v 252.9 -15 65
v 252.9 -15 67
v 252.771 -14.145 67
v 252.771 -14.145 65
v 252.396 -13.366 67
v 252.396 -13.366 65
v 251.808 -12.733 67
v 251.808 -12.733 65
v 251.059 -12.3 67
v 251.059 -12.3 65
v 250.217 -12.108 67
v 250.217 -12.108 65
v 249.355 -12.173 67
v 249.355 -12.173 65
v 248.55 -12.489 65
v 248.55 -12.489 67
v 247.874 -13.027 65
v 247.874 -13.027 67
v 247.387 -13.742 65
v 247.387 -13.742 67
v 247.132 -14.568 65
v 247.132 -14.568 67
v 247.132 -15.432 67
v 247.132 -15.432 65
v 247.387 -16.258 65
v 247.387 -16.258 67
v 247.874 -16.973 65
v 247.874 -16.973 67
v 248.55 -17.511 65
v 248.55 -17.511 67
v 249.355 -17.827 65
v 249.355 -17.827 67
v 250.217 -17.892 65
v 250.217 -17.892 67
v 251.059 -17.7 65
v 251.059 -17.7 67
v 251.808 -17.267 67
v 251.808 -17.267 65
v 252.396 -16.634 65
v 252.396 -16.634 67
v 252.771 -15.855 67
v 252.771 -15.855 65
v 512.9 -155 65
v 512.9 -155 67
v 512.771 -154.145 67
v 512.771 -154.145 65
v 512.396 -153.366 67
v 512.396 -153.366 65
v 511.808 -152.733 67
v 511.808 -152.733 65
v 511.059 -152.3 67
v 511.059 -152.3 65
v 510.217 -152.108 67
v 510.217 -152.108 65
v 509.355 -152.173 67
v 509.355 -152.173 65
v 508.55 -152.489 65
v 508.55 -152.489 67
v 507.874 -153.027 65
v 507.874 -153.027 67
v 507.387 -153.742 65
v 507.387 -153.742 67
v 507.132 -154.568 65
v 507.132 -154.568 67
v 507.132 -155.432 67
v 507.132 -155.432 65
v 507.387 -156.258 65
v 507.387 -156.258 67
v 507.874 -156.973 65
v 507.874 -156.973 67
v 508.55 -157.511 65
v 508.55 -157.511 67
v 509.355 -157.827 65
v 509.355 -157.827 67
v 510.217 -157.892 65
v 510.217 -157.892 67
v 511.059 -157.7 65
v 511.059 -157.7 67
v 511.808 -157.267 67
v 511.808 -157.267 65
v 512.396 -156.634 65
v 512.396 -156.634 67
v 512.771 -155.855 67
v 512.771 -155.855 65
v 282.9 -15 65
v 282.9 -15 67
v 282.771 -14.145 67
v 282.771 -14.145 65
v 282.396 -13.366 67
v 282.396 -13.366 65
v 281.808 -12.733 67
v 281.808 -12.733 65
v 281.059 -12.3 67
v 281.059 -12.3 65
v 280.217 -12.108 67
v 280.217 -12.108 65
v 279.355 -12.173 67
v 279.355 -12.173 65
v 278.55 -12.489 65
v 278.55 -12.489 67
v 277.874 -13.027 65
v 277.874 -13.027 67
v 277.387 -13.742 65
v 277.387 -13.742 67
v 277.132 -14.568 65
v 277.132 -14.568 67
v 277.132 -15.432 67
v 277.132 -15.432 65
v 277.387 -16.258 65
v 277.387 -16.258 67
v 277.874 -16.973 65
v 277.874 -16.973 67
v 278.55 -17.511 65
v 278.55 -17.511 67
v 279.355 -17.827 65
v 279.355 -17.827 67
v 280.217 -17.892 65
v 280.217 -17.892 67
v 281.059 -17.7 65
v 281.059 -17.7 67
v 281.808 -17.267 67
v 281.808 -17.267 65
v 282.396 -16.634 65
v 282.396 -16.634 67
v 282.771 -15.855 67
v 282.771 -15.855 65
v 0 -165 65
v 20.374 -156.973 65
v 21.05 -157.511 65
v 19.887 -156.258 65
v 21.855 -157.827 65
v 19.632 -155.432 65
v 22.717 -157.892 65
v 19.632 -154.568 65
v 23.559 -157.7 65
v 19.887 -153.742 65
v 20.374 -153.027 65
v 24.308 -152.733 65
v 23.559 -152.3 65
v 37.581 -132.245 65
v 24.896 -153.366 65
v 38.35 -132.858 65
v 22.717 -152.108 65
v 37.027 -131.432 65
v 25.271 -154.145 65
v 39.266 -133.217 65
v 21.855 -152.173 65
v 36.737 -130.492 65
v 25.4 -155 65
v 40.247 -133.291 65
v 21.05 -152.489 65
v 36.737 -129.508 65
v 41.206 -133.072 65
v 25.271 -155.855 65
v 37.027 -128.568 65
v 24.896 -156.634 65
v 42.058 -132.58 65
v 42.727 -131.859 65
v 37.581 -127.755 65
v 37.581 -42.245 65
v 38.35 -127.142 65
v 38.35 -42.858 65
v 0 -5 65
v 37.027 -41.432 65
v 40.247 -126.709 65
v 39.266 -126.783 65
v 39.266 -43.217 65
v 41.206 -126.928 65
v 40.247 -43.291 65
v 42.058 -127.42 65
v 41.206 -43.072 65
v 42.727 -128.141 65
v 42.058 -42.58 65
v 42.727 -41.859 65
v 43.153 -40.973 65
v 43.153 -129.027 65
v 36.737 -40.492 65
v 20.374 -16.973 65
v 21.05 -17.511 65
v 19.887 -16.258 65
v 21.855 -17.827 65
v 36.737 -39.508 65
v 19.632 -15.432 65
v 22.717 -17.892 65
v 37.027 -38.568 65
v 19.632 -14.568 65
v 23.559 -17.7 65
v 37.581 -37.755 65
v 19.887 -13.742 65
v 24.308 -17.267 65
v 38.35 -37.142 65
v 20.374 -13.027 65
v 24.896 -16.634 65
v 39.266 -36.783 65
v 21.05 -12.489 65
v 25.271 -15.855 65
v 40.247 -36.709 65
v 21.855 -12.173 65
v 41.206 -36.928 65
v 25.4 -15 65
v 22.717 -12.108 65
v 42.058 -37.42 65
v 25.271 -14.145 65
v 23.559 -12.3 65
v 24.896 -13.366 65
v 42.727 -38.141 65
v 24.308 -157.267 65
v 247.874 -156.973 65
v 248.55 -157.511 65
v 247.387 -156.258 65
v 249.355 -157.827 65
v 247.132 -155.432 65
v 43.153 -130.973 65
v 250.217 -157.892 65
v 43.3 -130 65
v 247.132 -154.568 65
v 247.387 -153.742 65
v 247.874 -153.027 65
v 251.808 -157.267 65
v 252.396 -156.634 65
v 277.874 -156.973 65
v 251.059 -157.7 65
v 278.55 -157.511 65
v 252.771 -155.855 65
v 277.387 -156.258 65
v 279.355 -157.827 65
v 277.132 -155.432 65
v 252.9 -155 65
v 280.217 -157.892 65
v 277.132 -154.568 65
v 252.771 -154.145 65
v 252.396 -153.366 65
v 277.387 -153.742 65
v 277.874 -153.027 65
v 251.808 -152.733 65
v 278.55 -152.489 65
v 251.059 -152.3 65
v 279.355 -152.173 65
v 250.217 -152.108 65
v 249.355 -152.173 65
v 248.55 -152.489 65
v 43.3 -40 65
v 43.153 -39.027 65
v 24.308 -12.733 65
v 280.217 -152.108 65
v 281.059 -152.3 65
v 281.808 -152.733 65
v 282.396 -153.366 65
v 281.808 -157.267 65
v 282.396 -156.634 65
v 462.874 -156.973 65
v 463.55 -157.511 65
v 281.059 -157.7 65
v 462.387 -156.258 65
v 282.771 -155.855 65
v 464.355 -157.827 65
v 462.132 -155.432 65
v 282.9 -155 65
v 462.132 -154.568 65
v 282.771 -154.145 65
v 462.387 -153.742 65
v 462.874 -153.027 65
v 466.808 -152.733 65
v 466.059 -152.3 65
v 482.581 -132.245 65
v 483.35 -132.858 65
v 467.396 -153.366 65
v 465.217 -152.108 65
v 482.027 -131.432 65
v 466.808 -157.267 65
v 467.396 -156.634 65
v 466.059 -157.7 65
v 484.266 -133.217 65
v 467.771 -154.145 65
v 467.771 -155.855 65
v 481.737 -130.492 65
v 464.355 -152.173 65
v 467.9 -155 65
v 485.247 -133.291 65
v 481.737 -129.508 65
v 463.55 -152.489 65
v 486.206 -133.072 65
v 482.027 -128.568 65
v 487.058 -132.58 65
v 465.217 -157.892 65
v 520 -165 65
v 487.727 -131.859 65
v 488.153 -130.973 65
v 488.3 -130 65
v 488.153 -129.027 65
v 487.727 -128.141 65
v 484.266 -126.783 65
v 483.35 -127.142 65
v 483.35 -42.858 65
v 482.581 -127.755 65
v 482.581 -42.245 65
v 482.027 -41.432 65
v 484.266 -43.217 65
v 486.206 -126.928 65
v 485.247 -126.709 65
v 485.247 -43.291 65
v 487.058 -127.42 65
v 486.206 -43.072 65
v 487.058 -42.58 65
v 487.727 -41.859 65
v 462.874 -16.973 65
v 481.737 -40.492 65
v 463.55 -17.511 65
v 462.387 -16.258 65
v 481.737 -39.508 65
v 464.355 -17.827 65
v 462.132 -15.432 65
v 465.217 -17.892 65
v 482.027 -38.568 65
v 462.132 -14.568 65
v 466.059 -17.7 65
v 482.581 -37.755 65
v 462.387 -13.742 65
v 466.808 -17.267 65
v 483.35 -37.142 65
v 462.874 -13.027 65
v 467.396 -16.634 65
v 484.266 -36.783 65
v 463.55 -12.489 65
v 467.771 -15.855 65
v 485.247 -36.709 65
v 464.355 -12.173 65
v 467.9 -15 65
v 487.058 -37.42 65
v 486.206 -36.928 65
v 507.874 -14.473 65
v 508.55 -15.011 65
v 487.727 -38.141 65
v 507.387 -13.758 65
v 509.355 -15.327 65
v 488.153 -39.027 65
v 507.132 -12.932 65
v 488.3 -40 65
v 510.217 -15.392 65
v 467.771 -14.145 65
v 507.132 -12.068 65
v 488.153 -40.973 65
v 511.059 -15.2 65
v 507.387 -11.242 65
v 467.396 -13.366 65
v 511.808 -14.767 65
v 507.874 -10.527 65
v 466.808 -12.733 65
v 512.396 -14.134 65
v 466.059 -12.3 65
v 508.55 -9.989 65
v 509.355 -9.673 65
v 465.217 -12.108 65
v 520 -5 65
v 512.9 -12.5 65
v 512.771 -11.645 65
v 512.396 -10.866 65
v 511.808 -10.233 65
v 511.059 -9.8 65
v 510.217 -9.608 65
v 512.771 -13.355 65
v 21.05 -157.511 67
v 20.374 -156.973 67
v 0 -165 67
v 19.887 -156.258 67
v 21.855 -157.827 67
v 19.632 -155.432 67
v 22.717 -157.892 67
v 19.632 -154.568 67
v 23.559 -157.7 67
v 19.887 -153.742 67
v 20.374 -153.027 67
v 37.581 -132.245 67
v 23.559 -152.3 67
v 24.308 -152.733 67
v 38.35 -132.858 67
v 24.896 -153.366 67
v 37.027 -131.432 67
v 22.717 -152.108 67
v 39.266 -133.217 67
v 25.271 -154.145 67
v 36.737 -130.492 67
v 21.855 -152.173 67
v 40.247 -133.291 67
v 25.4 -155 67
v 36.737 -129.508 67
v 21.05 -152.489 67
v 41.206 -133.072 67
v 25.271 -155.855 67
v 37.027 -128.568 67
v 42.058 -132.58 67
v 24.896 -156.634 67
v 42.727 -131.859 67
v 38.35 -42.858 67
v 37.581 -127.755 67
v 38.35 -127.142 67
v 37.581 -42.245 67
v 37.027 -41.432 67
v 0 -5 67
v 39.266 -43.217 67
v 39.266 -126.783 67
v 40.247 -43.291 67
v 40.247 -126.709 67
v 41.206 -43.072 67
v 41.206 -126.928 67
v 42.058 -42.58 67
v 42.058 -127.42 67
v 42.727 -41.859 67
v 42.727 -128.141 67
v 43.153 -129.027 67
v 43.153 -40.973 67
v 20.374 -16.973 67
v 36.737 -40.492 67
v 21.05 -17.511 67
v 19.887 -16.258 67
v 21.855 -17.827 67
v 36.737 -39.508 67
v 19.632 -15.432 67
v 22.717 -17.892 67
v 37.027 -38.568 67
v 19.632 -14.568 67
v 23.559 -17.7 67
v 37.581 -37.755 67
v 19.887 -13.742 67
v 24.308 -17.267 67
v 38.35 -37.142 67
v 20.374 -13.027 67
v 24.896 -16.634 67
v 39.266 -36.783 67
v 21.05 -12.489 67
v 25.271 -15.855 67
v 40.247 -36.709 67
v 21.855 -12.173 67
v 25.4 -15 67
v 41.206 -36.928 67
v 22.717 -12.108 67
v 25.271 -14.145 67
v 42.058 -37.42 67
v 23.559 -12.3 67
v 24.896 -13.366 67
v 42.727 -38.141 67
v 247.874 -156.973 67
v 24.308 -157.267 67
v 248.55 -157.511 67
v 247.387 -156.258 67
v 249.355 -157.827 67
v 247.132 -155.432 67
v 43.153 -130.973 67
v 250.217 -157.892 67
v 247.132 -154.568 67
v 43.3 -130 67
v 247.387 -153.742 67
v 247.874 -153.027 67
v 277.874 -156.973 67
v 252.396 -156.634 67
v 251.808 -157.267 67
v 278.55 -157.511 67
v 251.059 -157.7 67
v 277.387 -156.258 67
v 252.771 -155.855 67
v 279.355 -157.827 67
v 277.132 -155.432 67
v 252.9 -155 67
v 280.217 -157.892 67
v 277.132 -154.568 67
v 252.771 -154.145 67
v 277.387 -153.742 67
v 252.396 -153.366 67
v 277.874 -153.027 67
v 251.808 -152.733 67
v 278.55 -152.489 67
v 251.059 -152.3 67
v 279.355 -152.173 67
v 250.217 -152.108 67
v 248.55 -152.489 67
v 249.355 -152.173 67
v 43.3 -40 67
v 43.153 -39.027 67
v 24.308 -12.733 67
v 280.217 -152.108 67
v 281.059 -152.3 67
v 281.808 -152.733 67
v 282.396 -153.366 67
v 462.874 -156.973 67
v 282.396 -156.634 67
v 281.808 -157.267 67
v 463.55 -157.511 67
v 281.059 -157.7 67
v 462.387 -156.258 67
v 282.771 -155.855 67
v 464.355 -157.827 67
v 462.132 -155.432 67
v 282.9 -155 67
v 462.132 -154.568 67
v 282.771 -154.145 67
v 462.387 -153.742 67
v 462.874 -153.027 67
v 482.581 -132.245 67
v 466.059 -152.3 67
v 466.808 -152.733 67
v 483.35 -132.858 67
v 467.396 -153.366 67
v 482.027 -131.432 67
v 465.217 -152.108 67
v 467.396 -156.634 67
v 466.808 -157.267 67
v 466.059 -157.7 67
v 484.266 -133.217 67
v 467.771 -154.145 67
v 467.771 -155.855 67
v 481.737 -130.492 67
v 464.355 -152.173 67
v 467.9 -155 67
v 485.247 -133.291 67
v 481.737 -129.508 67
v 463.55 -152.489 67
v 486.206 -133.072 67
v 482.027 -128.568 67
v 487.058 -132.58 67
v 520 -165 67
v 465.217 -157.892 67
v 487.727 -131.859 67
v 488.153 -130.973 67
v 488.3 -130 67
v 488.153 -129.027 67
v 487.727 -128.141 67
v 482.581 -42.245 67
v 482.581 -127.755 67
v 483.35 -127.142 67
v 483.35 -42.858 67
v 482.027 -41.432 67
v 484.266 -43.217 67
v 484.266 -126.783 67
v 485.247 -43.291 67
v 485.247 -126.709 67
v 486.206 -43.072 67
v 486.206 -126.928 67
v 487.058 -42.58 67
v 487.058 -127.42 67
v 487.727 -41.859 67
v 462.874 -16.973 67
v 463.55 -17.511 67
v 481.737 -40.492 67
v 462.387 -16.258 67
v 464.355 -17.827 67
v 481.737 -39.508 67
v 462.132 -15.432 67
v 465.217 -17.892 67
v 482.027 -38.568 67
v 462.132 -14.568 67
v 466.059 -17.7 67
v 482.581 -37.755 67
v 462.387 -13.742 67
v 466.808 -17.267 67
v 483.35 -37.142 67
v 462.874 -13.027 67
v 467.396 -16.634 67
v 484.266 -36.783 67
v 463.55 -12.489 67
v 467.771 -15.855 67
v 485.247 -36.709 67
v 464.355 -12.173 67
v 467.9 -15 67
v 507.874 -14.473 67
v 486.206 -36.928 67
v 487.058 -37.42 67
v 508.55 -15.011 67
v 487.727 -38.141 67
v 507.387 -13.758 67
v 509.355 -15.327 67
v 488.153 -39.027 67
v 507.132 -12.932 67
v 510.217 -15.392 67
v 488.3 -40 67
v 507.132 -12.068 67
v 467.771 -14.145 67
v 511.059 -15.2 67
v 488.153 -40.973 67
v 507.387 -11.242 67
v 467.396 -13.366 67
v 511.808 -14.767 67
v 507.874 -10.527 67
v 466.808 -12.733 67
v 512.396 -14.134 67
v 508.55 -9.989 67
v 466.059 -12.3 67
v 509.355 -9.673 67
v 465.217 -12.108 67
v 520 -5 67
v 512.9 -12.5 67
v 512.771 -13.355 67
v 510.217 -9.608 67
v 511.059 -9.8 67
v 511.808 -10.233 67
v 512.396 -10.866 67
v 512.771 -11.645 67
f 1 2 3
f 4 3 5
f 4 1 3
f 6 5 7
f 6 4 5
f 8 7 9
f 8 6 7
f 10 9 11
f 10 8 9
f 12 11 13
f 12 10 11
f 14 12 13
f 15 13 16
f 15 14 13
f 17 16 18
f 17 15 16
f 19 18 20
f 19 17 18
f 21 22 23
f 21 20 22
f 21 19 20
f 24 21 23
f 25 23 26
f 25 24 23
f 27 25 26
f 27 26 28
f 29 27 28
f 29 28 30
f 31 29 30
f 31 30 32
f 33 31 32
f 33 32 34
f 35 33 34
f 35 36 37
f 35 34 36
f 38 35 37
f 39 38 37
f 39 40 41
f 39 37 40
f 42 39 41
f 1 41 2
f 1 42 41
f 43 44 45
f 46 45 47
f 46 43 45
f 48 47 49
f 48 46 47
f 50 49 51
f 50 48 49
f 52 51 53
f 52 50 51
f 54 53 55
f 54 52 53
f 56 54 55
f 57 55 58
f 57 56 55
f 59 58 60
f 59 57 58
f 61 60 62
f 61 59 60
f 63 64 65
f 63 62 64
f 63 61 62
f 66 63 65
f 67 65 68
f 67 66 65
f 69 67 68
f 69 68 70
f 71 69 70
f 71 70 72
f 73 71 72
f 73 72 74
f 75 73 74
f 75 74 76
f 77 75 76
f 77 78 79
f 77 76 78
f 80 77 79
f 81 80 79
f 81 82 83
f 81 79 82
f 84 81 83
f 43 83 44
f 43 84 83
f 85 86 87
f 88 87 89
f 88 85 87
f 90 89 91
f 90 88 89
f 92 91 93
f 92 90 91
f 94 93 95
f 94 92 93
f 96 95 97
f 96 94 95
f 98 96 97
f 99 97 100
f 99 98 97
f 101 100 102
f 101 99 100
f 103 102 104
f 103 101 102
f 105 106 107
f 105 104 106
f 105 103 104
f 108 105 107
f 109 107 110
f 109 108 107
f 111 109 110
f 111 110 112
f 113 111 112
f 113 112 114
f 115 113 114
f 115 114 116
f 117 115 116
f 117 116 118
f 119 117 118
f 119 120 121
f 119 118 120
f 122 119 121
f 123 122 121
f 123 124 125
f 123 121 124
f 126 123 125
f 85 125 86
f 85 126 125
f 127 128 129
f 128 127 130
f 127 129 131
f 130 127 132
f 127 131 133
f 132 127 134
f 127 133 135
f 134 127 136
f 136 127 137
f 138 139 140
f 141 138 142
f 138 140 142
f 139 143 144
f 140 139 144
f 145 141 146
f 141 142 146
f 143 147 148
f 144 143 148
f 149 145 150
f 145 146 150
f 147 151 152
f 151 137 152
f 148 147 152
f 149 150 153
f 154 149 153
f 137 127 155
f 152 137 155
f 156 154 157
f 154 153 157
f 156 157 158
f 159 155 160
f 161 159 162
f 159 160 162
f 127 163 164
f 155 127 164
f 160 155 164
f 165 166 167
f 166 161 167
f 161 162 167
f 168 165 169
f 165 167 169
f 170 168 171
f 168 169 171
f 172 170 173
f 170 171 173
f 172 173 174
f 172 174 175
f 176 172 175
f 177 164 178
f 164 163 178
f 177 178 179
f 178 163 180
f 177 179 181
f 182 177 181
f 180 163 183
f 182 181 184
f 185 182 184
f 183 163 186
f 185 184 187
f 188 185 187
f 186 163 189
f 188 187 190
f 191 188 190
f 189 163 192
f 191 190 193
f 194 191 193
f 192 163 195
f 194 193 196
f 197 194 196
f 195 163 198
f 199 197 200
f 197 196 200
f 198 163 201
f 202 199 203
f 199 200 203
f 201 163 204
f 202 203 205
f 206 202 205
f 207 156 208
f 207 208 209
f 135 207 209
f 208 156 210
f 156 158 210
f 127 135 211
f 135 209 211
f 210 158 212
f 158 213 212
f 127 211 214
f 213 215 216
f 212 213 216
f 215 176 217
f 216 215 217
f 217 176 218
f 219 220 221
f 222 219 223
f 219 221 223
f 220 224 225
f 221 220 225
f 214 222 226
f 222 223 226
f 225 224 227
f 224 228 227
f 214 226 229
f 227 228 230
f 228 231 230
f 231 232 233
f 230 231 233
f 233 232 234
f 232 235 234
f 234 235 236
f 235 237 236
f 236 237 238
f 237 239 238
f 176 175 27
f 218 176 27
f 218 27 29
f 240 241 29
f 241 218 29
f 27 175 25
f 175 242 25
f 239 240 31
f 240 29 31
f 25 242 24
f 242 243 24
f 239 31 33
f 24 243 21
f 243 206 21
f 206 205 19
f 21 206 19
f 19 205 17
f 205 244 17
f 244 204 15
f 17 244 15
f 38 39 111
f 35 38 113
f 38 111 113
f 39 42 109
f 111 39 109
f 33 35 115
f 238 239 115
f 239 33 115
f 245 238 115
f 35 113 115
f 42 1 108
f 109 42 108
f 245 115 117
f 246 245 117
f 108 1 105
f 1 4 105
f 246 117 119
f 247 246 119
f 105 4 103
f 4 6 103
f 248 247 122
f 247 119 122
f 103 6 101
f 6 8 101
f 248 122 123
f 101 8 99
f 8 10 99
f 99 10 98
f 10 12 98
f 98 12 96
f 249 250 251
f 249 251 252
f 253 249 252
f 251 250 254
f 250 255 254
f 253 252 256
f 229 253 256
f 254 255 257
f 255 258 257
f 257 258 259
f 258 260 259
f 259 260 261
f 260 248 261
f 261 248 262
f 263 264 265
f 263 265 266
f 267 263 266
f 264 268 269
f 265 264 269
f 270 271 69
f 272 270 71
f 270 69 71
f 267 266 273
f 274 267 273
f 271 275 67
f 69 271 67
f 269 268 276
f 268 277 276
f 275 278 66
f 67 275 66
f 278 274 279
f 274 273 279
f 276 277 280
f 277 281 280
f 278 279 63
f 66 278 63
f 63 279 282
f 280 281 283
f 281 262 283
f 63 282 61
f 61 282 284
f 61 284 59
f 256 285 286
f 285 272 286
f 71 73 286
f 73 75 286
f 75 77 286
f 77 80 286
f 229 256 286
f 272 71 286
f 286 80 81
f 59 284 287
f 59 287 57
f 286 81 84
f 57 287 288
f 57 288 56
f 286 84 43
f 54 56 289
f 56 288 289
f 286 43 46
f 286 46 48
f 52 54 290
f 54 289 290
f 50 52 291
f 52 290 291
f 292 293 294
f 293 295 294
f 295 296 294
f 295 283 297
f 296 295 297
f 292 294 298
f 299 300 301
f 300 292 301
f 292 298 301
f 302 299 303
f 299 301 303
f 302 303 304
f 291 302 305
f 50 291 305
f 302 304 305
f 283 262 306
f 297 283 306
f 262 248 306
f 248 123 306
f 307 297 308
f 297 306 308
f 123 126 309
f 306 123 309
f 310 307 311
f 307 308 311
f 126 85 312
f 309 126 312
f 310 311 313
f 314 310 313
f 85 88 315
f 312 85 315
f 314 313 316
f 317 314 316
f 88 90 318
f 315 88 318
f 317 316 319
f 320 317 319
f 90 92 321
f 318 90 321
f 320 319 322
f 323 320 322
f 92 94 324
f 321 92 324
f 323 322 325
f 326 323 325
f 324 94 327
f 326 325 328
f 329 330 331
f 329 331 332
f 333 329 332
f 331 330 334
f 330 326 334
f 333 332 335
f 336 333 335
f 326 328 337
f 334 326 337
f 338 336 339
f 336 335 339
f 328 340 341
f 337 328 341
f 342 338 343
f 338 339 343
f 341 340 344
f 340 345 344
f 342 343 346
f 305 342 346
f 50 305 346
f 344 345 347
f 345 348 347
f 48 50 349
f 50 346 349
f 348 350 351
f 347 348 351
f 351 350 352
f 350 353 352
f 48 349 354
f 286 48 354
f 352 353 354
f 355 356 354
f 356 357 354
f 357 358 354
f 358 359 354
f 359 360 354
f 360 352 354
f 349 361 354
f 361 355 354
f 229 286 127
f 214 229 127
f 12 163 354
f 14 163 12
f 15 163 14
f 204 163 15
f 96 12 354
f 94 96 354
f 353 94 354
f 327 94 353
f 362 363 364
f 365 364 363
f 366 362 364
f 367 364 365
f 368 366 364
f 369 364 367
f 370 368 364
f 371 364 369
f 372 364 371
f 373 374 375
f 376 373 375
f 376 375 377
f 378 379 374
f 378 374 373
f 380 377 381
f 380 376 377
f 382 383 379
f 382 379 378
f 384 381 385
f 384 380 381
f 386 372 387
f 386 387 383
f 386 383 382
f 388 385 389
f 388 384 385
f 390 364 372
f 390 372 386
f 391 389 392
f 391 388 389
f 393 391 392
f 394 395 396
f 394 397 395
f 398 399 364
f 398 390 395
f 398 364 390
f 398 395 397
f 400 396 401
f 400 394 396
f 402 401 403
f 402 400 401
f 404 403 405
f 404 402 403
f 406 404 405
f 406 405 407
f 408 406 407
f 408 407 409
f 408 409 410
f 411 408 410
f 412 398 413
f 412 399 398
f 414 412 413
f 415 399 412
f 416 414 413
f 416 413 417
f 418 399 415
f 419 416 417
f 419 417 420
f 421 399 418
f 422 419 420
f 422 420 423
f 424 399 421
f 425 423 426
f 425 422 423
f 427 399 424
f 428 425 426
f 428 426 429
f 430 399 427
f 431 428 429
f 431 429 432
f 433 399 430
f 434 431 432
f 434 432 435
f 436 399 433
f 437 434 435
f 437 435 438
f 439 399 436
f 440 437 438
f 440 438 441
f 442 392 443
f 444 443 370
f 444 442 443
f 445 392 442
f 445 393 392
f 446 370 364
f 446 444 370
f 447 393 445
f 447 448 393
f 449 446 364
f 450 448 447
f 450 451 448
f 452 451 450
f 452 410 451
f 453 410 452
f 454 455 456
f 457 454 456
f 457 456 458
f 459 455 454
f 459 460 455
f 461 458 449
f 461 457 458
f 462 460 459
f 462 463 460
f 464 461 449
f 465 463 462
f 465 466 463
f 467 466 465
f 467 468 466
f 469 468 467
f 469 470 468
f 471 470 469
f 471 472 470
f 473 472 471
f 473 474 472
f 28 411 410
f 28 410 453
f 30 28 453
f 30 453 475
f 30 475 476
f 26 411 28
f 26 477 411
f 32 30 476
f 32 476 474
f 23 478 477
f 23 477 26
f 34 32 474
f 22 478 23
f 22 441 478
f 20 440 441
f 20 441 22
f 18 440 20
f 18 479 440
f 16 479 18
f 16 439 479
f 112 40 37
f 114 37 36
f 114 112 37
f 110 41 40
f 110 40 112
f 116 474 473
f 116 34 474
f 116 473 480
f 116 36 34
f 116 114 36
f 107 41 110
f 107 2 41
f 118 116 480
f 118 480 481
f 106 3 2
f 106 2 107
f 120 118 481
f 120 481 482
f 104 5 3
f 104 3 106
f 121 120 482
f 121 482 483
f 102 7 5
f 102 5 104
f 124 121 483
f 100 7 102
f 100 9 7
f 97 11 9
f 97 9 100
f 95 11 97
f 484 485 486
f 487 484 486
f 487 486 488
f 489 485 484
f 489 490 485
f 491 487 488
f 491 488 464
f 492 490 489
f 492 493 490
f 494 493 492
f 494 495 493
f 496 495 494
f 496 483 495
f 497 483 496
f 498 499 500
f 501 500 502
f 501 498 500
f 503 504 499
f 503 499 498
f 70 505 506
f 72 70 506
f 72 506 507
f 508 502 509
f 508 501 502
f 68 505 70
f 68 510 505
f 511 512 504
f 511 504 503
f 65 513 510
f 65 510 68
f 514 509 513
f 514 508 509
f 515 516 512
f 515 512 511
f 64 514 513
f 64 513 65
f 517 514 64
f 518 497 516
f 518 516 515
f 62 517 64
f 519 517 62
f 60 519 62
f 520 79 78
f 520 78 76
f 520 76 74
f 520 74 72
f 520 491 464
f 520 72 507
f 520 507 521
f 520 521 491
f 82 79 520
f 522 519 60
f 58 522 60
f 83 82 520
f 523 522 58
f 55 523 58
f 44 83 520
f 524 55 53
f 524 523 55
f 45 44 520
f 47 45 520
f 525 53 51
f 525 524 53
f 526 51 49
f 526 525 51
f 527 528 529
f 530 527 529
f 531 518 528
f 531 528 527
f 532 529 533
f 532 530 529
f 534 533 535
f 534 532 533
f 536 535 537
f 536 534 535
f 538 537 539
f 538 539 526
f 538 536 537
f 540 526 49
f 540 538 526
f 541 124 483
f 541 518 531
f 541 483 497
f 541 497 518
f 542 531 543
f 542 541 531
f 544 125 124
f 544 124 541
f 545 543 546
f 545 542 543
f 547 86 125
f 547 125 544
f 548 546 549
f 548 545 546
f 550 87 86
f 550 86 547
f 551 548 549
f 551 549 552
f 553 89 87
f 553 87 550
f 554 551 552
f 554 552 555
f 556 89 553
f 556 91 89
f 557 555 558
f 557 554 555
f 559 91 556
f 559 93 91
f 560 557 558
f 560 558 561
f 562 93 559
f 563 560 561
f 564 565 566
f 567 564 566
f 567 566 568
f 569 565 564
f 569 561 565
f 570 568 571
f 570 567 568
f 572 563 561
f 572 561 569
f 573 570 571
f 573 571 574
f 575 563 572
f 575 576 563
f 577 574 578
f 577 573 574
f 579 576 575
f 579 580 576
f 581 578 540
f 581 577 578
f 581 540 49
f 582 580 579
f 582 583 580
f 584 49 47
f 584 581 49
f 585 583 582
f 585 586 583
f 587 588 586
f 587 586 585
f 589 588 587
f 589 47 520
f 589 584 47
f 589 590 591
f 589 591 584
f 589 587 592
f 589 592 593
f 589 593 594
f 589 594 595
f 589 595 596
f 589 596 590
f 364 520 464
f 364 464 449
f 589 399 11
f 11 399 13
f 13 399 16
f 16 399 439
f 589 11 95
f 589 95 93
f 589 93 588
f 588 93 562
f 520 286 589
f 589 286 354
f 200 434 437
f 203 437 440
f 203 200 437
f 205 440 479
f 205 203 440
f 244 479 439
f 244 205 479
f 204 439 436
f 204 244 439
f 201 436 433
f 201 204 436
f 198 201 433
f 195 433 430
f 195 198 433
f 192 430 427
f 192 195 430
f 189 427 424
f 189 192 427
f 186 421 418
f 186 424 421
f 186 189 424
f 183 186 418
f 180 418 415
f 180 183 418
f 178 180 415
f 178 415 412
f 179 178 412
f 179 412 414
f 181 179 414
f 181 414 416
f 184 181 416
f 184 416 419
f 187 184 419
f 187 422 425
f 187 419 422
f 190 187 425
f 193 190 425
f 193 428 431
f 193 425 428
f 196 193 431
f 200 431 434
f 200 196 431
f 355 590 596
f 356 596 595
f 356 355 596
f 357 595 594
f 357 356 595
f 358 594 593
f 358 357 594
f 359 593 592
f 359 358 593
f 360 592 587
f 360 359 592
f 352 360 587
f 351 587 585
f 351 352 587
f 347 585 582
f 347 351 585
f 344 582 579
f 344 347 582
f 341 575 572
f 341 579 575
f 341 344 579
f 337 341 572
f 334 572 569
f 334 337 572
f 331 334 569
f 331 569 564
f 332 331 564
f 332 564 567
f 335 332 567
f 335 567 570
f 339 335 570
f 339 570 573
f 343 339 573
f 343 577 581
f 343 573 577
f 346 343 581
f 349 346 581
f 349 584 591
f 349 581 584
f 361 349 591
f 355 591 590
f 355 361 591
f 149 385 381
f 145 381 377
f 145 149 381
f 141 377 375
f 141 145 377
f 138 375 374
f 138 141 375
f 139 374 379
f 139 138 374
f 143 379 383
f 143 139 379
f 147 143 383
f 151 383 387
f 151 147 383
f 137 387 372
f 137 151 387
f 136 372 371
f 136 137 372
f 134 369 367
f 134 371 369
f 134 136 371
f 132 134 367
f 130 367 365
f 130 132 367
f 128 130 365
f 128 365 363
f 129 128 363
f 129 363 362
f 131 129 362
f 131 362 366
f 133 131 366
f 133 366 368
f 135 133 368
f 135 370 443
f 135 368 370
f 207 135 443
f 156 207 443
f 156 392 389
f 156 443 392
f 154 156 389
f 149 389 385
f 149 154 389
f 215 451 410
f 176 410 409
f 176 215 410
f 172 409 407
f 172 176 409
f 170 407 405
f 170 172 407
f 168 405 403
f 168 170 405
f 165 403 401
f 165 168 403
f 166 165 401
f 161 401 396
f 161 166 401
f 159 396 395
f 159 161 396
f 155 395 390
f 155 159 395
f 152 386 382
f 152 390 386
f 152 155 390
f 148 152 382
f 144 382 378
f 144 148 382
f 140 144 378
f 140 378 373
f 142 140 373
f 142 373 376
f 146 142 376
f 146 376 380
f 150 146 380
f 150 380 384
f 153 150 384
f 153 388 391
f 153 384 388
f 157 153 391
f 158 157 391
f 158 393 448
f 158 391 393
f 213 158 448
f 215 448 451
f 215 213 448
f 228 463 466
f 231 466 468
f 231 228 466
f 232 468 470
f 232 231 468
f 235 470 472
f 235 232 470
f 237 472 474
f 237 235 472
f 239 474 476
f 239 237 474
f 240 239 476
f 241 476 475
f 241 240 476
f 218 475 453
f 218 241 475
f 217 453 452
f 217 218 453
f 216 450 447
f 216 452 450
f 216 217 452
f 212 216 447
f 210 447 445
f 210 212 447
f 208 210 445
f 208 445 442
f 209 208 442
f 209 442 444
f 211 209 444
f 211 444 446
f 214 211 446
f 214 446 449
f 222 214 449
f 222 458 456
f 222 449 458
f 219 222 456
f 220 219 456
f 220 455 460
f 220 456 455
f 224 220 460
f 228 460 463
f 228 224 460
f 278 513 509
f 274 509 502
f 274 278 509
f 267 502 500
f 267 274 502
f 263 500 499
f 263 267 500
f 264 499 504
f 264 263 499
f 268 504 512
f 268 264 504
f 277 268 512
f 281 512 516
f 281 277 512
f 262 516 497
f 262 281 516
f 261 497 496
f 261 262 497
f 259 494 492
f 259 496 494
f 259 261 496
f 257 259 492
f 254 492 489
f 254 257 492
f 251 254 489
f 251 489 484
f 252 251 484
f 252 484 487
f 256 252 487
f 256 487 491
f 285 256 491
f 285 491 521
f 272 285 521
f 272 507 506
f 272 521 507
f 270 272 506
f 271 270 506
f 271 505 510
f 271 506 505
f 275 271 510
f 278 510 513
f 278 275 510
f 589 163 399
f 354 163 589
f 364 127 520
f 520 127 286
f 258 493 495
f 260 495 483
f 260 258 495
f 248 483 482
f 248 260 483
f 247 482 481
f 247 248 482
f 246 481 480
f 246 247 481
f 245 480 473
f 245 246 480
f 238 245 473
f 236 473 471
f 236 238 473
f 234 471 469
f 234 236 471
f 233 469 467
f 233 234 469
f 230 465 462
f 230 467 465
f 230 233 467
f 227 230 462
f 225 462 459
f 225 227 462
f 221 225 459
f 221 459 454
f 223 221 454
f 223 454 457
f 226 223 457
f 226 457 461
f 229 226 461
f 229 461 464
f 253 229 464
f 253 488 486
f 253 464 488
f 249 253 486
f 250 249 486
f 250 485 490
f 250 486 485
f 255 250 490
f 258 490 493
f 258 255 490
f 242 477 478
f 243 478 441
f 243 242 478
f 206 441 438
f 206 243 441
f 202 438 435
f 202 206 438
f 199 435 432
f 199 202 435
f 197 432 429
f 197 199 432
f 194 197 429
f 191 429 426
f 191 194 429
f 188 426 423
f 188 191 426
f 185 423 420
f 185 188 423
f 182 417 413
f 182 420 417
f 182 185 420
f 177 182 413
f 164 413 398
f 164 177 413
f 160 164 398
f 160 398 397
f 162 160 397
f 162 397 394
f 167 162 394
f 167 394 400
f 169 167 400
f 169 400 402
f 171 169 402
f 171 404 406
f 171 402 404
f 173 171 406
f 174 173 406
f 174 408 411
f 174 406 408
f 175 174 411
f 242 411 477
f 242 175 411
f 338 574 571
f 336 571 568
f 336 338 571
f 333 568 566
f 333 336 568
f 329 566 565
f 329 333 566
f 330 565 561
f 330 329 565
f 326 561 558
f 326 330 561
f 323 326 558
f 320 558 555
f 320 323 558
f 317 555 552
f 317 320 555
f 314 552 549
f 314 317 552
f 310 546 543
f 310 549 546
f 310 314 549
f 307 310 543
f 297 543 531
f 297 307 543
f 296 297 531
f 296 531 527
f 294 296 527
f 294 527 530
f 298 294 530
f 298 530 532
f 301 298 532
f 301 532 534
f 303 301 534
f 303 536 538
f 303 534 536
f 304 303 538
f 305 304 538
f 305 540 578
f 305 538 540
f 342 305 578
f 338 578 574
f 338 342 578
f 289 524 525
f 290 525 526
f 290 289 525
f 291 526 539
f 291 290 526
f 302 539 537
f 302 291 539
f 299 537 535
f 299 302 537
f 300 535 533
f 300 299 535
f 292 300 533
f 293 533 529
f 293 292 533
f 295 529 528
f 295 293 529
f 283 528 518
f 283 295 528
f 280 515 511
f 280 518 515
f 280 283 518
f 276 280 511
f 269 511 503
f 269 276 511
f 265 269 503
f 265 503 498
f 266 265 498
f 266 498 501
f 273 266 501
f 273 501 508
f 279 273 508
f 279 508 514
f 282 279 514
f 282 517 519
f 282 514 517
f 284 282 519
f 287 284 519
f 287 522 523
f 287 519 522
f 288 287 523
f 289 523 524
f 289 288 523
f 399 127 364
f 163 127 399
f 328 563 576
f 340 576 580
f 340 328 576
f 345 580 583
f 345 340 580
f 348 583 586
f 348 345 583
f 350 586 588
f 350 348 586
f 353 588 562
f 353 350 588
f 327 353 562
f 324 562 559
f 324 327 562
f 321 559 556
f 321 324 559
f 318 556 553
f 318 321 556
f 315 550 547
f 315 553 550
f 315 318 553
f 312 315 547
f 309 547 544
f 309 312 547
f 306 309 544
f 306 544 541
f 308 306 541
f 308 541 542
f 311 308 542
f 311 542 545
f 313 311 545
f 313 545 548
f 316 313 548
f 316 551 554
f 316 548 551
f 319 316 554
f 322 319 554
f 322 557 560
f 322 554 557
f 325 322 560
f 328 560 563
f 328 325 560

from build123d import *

# Parameters (mm, degrees)
SKETCH037_W   = 520
SKETCH037_H   = 160
PAD013_DEPTH  = 2
SKETCH038_R   = 2.9
HOLE013_DEPTH = 25
SKETCH039_R   = 3.3
HOLE014_DEPTH = 25


with BuildPart() as part:
    # Sketch037 → Pad013 (new body)
    with BuildSketch(Plane.XY):
        with Locations((260, -80)):
            Rectangle(SKETCH037_W, SKETCH037_H)
    extrude(amount=PAD013_DEPTH)

    # Sketch038 → Hole013 (cut)
    with BuildSketch(Plane.XY):
        with Locations((22.5, -10)):
            Circle(SKETCH038_R)
        with Locations((22.5, -150)):
            Circle(SKETCH038_R)
        with Locations((250, -10)):
            Circle(SKETCH038_R)
        with Locations((280, -10)):
            Circle(SKETCH038_R)
        with Locations((250, -150)):
            Circle(SKETCH038_R)
        with Locations((280, -150)):
            Circle(SKETCH038_R)
        with Locations((465, -150)):
            Circle(SKETCH038_R)
        with Locations((465, -10)):
            Circle(SKETCH038_R)
        with Locations((510, -7.5)):
            Circle(SKETCH038_R)
        with Locations((510, -150)):
            Circle(SKETCH038_R)
    extrude(amount=HOLE013_DEPTH, mode=Mode.SUBTRACT)

    # Sketch039 → Hole014 (cut)
    with BuildSketch(Plane.XY):
        with Locations((40, -35)):
            Circle(SKETCH039_R)
        with Locations((40, -125)):
            Circle(SKETCH039_R)
        with Locations((485, -35)):
            Circle(SKETCH039_R)
        with Locations((485, -125)):
            Circle(SKETCH039_R)
    extrude(amount=HOLE014_DEPTH, mode=Mode.SUBTRACT)


with BuildPart() as part_1:
    # Body006 placement: moved
    add(part.part.moved(Location((0, -5, 65))))


solid = part_1.part
